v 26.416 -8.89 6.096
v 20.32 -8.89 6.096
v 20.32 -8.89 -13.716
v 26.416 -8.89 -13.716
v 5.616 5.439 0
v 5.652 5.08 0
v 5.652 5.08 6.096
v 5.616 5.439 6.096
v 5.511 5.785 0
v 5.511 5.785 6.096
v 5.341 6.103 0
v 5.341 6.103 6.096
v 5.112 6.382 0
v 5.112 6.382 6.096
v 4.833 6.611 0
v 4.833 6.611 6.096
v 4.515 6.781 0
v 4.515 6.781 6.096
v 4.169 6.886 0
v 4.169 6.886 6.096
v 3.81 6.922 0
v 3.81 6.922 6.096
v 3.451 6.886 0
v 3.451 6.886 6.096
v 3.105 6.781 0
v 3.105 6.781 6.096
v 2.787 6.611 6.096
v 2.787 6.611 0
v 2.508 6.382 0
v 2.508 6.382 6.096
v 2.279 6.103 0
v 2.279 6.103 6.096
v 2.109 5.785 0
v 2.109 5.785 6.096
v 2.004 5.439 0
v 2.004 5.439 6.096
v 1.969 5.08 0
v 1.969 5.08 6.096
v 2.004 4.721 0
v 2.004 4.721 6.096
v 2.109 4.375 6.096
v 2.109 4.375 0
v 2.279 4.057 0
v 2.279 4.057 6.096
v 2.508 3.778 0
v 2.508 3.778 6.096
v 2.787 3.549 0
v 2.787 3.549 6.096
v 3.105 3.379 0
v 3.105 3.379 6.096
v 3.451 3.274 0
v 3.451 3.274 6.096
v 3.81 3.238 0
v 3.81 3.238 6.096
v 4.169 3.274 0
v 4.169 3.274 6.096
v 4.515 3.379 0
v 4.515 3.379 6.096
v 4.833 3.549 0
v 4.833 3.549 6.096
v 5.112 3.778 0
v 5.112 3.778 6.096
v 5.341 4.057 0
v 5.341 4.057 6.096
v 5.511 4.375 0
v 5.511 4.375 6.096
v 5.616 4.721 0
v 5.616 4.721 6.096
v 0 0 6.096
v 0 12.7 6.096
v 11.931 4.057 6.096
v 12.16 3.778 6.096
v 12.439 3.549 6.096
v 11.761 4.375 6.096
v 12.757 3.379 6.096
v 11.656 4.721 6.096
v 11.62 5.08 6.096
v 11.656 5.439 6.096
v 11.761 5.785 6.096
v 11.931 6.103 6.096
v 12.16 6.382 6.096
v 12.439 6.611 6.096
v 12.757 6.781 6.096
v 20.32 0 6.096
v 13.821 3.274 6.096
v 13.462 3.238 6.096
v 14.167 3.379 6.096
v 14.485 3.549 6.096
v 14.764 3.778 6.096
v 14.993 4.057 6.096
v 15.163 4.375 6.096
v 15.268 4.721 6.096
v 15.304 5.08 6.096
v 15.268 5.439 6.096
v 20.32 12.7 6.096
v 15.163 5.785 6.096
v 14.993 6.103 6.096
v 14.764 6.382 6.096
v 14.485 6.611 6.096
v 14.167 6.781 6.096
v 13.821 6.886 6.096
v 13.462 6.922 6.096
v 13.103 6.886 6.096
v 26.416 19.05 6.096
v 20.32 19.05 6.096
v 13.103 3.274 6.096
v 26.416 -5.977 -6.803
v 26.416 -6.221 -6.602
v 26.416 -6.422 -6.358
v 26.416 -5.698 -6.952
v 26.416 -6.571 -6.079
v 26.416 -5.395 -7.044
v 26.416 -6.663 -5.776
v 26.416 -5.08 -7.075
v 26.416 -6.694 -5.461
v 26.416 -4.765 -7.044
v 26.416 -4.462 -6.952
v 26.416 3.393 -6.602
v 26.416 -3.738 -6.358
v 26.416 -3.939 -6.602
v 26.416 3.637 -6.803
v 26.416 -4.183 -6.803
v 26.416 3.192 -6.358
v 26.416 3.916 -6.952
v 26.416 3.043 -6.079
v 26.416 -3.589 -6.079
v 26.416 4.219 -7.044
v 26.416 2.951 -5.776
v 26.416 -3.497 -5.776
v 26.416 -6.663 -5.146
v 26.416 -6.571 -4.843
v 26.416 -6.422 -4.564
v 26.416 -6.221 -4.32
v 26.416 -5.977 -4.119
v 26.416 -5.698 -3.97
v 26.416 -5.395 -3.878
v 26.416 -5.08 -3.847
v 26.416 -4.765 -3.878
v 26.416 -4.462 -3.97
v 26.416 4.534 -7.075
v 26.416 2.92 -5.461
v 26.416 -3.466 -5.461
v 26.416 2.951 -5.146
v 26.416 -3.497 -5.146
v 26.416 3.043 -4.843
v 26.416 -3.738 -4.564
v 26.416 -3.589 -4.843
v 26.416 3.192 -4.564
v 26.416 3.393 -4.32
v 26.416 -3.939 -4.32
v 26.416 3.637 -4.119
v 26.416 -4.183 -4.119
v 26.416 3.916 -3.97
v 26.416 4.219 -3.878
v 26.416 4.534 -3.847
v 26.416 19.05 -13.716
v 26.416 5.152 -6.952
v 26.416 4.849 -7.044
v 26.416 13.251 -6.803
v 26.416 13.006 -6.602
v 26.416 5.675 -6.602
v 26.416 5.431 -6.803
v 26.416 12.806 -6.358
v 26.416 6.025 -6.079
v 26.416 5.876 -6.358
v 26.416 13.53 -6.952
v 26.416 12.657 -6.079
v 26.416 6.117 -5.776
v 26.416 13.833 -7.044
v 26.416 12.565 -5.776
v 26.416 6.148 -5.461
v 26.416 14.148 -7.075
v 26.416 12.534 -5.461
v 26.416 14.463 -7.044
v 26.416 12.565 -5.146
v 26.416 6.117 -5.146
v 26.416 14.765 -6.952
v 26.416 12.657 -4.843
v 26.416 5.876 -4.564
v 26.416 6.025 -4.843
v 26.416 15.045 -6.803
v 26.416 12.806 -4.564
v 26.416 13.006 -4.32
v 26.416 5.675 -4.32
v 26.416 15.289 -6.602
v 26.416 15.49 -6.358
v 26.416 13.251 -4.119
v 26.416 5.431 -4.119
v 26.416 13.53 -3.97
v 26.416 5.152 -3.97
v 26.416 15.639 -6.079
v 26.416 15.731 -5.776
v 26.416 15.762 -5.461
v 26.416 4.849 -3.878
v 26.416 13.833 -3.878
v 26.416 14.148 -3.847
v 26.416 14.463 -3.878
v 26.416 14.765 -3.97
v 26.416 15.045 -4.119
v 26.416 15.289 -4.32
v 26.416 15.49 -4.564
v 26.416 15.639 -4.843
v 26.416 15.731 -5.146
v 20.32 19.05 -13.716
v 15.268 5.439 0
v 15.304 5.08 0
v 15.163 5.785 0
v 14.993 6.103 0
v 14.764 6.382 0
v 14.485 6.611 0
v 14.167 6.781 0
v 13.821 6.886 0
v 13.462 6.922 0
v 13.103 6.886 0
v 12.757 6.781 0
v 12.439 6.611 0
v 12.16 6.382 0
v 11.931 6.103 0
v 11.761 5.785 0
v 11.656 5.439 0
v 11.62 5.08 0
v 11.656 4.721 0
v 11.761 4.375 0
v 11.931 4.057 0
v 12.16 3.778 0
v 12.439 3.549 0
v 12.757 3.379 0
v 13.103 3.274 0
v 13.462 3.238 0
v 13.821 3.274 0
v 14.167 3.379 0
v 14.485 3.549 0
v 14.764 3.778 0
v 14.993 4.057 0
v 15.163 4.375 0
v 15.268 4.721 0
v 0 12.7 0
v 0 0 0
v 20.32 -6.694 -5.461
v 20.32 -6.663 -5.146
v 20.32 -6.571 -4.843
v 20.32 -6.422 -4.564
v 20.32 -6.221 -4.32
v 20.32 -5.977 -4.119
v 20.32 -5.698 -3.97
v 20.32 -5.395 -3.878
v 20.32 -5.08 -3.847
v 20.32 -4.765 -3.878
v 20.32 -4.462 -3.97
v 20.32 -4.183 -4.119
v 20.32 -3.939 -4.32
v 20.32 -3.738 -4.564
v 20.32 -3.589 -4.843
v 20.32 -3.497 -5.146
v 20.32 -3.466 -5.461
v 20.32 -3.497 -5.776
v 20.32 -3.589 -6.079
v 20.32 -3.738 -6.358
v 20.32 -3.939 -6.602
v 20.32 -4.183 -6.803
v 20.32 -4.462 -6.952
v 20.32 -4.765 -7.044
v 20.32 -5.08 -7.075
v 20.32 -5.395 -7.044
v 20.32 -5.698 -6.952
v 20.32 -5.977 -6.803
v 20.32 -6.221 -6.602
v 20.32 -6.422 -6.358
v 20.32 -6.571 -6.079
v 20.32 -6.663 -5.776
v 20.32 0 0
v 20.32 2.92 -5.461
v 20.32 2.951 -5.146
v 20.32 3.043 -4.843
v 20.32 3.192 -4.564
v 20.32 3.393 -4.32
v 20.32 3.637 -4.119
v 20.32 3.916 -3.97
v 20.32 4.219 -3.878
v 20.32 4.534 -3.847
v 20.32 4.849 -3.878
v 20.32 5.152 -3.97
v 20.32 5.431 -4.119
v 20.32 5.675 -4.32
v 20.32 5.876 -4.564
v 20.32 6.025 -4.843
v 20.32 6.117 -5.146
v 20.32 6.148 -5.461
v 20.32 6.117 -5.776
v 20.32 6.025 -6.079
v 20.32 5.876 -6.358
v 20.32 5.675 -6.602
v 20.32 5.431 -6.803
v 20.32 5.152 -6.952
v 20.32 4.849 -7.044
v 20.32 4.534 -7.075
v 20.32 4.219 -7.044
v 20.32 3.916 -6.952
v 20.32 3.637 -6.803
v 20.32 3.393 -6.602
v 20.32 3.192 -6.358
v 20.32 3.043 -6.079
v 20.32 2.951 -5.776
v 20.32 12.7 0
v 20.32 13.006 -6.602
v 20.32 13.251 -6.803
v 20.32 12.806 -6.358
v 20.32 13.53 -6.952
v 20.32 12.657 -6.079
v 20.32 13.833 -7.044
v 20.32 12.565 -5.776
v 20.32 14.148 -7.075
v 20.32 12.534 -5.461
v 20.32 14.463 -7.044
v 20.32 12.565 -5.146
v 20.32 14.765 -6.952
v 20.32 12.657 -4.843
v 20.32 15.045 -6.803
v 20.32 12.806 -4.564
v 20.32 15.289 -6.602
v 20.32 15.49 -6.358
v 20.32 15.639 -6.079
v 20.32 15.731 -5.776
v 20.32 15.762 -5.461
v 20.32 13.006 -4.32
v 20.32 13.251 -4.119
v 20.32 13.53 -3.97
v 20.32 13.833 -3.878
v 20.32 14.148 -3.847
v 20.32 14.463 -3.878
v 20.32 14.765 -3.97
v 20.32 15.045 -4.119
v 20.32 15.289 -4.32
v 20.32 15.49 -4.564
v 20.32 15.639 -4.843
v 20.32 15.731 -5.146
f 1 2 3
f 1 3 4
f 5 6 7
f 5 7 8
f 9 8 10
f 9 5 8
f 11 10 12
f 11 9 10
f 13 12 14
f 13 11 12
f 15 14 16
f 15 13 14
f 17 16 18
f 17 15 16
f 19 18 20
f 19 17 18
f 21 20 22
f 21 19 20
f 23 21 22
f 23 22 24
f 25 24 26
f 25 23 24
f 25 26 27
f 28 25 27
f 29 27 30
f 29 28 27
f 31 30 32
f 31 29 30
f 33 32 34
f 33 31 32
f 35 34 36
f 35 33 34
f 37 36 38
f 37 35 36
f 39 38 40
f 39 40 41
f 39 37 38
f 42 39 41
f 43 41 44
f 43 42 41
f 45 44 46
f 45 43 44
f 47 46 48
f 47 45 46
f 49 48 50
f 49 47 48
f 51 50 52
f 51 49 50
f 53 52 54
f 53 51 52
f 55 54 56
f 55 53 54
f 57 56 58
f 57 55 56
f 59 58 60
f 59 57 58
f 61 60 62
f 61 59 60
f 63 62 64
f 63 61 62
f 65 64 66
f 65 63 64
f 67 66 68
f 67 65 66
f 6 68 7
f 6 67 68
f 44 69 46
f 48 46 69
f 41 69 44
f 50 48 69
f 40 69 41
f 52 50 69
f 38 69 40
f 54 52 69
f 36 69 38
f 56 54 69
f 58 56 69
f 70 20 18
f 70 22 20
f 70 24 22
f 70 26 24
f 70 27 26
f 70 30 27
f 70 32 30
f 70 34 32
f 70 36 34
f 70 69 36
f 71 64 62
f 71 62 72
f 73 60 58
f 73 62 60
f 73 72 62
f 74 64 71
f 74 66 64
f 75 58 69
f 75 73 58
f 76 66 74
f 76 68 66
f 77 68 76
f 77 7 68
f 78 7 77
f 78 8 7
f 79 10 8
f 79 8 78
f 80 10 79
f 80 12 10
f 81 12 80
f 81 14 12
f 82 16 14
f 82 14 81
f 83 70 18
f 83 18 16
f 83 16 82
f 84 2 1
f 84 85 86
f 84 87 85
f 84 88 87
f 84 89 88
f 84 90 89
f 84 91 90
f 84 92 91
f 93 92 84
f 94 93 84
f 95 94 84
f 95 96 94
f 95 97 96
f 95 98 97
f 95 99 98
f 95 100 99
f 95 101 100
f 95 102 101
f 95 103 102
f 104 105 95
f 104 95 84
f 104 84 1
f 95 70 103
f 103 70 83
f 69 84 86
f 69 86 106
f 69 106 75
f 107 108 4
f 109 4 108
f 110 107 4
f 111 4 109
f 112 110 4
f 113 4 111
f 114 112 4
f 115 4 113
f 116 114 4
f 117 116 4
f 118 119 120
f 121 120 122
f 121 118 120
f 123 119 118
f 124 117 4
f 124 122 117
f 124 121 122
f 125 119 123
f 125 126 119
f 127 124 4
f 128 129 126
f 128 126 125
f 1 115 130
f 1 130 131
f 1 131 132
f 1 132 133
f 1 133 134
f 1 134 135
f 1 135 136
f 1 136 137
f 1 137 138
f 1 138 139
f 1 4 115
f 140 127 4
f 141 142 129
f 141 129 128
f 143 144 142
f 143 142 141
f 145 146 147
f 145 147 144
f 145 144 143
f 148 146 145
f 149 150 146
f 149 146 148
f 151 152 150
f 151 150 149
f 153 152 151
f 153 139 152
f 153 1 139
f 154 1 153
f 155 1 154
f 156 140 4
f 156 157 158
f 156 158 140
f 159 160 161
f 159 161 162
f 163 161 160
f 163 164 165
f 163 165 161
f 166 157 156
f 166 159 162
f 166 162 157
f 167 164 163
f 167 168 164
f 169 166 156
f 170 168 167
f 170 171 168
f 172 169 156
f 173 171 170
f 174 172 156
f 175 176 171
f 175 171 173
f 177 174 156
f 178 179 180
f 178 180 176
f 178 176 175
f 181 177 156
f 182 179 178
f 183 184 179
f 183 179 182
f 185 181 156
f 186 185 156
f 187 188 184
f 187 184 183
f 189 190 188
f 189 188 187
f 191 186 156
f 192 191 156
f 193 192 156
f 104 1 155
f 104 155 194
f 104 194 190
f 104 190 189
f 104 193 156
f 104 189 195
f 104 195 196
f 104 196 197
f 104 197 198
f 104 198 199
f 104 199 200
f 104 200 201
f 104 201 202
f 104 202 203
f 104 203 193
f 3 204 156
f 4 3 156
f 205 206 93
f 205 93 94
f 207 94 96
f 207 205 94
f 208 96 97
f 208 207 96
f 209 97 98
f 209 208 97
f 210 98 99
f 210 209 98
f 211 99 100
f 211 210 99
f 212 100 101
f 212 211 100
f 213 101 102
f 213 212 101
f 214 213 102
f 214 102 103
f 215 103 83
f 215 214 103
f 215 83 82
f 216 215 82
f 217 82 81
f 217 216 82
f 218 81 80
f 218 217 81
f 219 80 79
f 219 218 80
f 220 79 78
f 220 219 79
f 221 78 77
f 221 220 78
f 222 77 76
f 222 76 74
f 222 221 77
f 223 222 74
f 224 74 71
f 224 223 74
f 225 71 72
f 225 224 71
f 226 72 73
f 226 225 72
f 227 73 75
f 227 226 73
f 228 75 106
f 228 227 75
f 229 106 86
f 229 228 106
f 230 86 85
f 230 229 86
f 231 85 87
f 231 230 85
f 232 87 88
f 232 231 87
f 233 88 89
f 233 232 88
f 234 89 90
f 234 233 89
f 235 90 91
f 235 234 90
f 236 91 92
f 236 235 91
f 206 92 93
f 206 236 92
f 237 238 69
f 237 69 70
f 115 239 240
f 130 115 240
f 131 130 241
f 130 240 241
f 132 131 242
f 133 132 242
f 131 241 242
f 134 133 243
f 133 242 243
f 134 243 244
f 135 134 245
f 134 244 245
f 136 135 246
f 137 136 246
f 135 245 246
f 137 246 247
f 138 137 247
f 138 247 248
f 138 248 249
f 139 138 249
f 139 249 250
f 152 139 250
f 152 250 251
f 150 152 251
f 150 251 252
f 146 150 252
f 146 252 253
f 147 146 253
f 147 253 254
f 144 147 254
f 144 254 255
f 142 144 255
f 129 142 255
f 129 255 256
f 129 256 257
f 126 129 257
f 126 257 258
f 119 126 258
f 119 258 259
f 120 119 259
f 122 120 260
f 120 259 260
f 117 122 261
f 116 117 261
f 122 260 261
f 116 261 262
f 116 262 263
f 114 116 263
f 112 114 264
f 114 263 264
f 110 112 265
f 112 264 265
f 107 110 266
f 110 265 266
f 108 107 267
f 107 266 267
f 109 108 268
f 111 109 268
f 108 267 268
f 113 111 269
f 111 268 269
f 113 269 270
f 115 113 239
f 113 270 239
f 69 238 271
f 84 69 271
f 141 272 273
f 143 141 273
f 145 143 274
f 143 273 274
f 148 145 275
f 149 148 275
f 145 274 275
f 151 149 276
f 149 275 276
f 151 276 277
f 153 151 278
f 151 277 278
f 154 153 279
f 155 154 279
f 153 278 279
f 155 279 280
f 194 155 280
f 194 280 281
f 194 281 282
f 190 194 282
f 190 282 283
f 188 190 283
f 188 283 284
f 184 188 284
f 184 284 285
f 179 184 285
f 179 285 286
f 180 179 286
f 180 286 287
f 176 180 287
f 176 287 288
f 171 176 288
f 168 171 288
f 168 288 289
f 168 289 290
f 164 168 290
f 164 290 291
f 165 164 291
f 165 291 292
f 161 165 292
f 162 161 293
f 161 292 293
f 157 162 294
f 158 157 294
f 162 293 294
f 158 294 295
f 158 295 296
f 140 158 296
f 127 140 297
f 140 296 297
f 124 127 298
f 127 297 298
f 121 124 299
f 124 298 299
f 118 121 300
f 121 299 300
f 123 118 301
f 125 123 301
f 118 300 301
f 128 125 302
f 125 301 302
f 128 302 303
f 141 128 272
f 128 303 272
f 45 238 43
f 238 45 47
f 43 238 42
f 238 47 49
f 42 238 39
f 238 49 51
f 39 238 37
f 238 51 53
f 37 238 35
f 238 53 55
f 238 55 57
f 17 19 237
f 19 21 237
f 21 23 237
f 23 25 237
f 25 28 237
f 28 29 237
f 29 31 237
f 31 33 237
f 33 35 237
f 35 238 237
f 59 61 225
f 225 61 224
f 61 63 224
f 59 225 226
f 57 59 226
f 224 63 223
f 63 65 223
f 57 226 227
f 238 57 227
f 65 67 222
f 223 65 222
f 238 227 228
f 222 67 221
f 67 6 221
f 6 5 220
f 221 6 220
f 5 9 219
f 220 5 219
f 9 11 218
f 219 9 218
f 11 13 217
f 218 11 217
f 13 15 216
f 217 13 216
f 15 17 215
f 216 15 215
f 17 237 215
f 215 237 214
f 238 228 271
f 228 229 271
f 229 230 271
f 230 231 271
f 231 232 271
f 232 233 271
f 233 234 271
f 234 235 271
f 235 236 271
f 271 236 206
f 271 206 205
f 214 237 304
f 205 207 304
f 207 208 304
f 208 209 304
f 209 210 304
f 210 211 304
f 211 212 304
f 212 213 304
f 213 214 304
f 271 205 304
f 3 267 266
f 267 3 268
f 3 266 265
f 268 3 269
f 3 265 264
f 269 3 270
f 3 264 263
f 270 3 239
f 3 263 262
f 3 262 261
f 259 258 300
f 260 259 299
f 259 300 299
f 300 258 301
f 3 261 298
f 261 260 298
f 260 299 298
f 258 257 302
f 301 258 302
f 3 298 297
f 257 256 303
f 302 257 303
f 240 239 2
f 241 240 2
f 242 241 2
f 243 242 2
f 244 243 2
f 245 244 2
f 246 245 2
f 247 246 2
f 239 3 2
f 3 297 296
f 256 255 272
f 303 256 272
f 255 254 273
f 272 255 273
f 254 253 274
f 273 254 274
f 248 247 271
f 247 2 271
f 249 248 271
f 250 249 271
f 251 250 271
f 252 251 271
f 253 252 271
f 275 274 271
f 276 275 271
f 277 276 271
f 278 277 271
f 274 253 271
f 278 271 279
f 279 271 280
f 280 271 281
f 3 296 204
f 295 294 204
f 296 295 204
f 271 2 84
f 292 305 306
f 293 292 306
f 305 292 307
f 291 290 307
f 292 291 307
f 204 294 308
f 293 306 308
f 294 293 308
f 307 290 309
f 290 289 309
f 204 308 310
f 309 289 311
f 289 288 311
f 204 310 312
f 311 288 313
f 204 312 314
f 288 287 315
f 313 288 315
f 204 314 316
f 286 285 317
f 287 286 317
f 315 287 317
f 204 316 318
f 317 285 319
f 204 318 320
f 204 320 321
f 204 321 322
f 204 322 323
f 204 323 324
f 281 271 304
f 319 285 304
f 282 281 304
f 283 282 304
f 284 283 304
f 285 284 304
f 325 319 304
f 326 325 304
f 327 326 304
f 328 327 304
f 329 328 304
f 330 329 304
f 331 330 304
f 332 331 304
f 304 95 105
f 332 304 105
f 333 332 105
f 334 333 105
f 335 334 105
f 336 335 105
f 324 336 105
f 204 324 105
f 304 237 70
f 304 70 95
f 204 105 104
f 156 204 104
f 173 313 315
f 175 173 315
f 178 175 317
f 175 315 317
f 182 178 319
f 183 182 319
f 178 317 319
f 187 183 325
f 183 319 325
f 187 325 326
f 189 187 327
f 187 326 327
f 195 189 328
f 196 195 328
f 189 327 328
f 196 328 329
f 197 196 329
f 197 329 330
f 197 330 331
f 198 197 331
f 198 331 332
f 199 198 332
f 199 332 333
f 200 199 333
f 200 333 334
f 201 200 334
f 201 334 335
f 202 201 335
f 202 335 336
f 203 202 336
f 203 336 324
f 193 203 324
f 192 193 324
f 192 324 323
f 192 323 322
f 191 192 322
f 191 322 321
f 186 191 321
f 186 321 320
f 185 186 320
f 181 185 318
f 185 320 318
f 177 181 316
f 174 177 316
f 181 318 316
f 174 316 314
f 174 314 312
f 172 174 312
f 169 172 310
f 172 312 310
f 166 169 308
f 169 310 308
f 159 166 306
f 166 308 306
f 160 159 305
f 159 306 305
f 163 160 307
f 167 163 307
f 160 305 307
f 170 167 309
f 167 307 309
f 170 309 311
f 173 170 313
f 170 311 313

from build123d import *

# Parameters (mm, degrees)
F0_W     = 20.32
F0_H     = 12.7
F0_R     = 1.8415
F1_DEPTH = 6.096
F2_W     = 6.096
F2_H     = 27.94
F3_DEPTH = 19.812
F4_R     = 1.614101
F5_DEPTH = 25.4


with BuildPart() as f1:
    # F0 (on Top) → F1 (new body)
    with BuildSketch(Plane.XY):
        with Locations((10.16, 6.35)):
            Rectangle(F0_W, F0_H)
        with Locations((3.81, 5.08)):
            Circle(F0_R, mode=Mode.SUBTRACT)
        with Locations((13.462, 5.08)):
            Circle(F0_R, mode=Mode.SUBTRACT)
    extrude(amount=F1_DEPTH)

    # F2 (on face) → F3 (join)
    with BuildSketch(Plane.XY.offset(6.096)):
        with Locations((23.368, 5.08)):
            Rectangle(F2_W, F2_H)
    extrude(amount=-F3_DEPTH)

    # F4 (on face) → F5 (cut)
    with BuildSketch(Plane(origin=(20.32, 0, 0), x_dir=(0, -1, 0), z_dir=(-1, 0, 0))):
        with Locations((5.08, -5.461)):
            Circle(F4_R)
        with Locations((-4.5339, -5.461)):
            Circle(F4_R)
        with Locations((-14.1478, -5.461)):
            Circle(F4_R)
    extrude(amount=-F5_DEPTH, mode=Mode.SUBTRACT)


solid = f1.part
